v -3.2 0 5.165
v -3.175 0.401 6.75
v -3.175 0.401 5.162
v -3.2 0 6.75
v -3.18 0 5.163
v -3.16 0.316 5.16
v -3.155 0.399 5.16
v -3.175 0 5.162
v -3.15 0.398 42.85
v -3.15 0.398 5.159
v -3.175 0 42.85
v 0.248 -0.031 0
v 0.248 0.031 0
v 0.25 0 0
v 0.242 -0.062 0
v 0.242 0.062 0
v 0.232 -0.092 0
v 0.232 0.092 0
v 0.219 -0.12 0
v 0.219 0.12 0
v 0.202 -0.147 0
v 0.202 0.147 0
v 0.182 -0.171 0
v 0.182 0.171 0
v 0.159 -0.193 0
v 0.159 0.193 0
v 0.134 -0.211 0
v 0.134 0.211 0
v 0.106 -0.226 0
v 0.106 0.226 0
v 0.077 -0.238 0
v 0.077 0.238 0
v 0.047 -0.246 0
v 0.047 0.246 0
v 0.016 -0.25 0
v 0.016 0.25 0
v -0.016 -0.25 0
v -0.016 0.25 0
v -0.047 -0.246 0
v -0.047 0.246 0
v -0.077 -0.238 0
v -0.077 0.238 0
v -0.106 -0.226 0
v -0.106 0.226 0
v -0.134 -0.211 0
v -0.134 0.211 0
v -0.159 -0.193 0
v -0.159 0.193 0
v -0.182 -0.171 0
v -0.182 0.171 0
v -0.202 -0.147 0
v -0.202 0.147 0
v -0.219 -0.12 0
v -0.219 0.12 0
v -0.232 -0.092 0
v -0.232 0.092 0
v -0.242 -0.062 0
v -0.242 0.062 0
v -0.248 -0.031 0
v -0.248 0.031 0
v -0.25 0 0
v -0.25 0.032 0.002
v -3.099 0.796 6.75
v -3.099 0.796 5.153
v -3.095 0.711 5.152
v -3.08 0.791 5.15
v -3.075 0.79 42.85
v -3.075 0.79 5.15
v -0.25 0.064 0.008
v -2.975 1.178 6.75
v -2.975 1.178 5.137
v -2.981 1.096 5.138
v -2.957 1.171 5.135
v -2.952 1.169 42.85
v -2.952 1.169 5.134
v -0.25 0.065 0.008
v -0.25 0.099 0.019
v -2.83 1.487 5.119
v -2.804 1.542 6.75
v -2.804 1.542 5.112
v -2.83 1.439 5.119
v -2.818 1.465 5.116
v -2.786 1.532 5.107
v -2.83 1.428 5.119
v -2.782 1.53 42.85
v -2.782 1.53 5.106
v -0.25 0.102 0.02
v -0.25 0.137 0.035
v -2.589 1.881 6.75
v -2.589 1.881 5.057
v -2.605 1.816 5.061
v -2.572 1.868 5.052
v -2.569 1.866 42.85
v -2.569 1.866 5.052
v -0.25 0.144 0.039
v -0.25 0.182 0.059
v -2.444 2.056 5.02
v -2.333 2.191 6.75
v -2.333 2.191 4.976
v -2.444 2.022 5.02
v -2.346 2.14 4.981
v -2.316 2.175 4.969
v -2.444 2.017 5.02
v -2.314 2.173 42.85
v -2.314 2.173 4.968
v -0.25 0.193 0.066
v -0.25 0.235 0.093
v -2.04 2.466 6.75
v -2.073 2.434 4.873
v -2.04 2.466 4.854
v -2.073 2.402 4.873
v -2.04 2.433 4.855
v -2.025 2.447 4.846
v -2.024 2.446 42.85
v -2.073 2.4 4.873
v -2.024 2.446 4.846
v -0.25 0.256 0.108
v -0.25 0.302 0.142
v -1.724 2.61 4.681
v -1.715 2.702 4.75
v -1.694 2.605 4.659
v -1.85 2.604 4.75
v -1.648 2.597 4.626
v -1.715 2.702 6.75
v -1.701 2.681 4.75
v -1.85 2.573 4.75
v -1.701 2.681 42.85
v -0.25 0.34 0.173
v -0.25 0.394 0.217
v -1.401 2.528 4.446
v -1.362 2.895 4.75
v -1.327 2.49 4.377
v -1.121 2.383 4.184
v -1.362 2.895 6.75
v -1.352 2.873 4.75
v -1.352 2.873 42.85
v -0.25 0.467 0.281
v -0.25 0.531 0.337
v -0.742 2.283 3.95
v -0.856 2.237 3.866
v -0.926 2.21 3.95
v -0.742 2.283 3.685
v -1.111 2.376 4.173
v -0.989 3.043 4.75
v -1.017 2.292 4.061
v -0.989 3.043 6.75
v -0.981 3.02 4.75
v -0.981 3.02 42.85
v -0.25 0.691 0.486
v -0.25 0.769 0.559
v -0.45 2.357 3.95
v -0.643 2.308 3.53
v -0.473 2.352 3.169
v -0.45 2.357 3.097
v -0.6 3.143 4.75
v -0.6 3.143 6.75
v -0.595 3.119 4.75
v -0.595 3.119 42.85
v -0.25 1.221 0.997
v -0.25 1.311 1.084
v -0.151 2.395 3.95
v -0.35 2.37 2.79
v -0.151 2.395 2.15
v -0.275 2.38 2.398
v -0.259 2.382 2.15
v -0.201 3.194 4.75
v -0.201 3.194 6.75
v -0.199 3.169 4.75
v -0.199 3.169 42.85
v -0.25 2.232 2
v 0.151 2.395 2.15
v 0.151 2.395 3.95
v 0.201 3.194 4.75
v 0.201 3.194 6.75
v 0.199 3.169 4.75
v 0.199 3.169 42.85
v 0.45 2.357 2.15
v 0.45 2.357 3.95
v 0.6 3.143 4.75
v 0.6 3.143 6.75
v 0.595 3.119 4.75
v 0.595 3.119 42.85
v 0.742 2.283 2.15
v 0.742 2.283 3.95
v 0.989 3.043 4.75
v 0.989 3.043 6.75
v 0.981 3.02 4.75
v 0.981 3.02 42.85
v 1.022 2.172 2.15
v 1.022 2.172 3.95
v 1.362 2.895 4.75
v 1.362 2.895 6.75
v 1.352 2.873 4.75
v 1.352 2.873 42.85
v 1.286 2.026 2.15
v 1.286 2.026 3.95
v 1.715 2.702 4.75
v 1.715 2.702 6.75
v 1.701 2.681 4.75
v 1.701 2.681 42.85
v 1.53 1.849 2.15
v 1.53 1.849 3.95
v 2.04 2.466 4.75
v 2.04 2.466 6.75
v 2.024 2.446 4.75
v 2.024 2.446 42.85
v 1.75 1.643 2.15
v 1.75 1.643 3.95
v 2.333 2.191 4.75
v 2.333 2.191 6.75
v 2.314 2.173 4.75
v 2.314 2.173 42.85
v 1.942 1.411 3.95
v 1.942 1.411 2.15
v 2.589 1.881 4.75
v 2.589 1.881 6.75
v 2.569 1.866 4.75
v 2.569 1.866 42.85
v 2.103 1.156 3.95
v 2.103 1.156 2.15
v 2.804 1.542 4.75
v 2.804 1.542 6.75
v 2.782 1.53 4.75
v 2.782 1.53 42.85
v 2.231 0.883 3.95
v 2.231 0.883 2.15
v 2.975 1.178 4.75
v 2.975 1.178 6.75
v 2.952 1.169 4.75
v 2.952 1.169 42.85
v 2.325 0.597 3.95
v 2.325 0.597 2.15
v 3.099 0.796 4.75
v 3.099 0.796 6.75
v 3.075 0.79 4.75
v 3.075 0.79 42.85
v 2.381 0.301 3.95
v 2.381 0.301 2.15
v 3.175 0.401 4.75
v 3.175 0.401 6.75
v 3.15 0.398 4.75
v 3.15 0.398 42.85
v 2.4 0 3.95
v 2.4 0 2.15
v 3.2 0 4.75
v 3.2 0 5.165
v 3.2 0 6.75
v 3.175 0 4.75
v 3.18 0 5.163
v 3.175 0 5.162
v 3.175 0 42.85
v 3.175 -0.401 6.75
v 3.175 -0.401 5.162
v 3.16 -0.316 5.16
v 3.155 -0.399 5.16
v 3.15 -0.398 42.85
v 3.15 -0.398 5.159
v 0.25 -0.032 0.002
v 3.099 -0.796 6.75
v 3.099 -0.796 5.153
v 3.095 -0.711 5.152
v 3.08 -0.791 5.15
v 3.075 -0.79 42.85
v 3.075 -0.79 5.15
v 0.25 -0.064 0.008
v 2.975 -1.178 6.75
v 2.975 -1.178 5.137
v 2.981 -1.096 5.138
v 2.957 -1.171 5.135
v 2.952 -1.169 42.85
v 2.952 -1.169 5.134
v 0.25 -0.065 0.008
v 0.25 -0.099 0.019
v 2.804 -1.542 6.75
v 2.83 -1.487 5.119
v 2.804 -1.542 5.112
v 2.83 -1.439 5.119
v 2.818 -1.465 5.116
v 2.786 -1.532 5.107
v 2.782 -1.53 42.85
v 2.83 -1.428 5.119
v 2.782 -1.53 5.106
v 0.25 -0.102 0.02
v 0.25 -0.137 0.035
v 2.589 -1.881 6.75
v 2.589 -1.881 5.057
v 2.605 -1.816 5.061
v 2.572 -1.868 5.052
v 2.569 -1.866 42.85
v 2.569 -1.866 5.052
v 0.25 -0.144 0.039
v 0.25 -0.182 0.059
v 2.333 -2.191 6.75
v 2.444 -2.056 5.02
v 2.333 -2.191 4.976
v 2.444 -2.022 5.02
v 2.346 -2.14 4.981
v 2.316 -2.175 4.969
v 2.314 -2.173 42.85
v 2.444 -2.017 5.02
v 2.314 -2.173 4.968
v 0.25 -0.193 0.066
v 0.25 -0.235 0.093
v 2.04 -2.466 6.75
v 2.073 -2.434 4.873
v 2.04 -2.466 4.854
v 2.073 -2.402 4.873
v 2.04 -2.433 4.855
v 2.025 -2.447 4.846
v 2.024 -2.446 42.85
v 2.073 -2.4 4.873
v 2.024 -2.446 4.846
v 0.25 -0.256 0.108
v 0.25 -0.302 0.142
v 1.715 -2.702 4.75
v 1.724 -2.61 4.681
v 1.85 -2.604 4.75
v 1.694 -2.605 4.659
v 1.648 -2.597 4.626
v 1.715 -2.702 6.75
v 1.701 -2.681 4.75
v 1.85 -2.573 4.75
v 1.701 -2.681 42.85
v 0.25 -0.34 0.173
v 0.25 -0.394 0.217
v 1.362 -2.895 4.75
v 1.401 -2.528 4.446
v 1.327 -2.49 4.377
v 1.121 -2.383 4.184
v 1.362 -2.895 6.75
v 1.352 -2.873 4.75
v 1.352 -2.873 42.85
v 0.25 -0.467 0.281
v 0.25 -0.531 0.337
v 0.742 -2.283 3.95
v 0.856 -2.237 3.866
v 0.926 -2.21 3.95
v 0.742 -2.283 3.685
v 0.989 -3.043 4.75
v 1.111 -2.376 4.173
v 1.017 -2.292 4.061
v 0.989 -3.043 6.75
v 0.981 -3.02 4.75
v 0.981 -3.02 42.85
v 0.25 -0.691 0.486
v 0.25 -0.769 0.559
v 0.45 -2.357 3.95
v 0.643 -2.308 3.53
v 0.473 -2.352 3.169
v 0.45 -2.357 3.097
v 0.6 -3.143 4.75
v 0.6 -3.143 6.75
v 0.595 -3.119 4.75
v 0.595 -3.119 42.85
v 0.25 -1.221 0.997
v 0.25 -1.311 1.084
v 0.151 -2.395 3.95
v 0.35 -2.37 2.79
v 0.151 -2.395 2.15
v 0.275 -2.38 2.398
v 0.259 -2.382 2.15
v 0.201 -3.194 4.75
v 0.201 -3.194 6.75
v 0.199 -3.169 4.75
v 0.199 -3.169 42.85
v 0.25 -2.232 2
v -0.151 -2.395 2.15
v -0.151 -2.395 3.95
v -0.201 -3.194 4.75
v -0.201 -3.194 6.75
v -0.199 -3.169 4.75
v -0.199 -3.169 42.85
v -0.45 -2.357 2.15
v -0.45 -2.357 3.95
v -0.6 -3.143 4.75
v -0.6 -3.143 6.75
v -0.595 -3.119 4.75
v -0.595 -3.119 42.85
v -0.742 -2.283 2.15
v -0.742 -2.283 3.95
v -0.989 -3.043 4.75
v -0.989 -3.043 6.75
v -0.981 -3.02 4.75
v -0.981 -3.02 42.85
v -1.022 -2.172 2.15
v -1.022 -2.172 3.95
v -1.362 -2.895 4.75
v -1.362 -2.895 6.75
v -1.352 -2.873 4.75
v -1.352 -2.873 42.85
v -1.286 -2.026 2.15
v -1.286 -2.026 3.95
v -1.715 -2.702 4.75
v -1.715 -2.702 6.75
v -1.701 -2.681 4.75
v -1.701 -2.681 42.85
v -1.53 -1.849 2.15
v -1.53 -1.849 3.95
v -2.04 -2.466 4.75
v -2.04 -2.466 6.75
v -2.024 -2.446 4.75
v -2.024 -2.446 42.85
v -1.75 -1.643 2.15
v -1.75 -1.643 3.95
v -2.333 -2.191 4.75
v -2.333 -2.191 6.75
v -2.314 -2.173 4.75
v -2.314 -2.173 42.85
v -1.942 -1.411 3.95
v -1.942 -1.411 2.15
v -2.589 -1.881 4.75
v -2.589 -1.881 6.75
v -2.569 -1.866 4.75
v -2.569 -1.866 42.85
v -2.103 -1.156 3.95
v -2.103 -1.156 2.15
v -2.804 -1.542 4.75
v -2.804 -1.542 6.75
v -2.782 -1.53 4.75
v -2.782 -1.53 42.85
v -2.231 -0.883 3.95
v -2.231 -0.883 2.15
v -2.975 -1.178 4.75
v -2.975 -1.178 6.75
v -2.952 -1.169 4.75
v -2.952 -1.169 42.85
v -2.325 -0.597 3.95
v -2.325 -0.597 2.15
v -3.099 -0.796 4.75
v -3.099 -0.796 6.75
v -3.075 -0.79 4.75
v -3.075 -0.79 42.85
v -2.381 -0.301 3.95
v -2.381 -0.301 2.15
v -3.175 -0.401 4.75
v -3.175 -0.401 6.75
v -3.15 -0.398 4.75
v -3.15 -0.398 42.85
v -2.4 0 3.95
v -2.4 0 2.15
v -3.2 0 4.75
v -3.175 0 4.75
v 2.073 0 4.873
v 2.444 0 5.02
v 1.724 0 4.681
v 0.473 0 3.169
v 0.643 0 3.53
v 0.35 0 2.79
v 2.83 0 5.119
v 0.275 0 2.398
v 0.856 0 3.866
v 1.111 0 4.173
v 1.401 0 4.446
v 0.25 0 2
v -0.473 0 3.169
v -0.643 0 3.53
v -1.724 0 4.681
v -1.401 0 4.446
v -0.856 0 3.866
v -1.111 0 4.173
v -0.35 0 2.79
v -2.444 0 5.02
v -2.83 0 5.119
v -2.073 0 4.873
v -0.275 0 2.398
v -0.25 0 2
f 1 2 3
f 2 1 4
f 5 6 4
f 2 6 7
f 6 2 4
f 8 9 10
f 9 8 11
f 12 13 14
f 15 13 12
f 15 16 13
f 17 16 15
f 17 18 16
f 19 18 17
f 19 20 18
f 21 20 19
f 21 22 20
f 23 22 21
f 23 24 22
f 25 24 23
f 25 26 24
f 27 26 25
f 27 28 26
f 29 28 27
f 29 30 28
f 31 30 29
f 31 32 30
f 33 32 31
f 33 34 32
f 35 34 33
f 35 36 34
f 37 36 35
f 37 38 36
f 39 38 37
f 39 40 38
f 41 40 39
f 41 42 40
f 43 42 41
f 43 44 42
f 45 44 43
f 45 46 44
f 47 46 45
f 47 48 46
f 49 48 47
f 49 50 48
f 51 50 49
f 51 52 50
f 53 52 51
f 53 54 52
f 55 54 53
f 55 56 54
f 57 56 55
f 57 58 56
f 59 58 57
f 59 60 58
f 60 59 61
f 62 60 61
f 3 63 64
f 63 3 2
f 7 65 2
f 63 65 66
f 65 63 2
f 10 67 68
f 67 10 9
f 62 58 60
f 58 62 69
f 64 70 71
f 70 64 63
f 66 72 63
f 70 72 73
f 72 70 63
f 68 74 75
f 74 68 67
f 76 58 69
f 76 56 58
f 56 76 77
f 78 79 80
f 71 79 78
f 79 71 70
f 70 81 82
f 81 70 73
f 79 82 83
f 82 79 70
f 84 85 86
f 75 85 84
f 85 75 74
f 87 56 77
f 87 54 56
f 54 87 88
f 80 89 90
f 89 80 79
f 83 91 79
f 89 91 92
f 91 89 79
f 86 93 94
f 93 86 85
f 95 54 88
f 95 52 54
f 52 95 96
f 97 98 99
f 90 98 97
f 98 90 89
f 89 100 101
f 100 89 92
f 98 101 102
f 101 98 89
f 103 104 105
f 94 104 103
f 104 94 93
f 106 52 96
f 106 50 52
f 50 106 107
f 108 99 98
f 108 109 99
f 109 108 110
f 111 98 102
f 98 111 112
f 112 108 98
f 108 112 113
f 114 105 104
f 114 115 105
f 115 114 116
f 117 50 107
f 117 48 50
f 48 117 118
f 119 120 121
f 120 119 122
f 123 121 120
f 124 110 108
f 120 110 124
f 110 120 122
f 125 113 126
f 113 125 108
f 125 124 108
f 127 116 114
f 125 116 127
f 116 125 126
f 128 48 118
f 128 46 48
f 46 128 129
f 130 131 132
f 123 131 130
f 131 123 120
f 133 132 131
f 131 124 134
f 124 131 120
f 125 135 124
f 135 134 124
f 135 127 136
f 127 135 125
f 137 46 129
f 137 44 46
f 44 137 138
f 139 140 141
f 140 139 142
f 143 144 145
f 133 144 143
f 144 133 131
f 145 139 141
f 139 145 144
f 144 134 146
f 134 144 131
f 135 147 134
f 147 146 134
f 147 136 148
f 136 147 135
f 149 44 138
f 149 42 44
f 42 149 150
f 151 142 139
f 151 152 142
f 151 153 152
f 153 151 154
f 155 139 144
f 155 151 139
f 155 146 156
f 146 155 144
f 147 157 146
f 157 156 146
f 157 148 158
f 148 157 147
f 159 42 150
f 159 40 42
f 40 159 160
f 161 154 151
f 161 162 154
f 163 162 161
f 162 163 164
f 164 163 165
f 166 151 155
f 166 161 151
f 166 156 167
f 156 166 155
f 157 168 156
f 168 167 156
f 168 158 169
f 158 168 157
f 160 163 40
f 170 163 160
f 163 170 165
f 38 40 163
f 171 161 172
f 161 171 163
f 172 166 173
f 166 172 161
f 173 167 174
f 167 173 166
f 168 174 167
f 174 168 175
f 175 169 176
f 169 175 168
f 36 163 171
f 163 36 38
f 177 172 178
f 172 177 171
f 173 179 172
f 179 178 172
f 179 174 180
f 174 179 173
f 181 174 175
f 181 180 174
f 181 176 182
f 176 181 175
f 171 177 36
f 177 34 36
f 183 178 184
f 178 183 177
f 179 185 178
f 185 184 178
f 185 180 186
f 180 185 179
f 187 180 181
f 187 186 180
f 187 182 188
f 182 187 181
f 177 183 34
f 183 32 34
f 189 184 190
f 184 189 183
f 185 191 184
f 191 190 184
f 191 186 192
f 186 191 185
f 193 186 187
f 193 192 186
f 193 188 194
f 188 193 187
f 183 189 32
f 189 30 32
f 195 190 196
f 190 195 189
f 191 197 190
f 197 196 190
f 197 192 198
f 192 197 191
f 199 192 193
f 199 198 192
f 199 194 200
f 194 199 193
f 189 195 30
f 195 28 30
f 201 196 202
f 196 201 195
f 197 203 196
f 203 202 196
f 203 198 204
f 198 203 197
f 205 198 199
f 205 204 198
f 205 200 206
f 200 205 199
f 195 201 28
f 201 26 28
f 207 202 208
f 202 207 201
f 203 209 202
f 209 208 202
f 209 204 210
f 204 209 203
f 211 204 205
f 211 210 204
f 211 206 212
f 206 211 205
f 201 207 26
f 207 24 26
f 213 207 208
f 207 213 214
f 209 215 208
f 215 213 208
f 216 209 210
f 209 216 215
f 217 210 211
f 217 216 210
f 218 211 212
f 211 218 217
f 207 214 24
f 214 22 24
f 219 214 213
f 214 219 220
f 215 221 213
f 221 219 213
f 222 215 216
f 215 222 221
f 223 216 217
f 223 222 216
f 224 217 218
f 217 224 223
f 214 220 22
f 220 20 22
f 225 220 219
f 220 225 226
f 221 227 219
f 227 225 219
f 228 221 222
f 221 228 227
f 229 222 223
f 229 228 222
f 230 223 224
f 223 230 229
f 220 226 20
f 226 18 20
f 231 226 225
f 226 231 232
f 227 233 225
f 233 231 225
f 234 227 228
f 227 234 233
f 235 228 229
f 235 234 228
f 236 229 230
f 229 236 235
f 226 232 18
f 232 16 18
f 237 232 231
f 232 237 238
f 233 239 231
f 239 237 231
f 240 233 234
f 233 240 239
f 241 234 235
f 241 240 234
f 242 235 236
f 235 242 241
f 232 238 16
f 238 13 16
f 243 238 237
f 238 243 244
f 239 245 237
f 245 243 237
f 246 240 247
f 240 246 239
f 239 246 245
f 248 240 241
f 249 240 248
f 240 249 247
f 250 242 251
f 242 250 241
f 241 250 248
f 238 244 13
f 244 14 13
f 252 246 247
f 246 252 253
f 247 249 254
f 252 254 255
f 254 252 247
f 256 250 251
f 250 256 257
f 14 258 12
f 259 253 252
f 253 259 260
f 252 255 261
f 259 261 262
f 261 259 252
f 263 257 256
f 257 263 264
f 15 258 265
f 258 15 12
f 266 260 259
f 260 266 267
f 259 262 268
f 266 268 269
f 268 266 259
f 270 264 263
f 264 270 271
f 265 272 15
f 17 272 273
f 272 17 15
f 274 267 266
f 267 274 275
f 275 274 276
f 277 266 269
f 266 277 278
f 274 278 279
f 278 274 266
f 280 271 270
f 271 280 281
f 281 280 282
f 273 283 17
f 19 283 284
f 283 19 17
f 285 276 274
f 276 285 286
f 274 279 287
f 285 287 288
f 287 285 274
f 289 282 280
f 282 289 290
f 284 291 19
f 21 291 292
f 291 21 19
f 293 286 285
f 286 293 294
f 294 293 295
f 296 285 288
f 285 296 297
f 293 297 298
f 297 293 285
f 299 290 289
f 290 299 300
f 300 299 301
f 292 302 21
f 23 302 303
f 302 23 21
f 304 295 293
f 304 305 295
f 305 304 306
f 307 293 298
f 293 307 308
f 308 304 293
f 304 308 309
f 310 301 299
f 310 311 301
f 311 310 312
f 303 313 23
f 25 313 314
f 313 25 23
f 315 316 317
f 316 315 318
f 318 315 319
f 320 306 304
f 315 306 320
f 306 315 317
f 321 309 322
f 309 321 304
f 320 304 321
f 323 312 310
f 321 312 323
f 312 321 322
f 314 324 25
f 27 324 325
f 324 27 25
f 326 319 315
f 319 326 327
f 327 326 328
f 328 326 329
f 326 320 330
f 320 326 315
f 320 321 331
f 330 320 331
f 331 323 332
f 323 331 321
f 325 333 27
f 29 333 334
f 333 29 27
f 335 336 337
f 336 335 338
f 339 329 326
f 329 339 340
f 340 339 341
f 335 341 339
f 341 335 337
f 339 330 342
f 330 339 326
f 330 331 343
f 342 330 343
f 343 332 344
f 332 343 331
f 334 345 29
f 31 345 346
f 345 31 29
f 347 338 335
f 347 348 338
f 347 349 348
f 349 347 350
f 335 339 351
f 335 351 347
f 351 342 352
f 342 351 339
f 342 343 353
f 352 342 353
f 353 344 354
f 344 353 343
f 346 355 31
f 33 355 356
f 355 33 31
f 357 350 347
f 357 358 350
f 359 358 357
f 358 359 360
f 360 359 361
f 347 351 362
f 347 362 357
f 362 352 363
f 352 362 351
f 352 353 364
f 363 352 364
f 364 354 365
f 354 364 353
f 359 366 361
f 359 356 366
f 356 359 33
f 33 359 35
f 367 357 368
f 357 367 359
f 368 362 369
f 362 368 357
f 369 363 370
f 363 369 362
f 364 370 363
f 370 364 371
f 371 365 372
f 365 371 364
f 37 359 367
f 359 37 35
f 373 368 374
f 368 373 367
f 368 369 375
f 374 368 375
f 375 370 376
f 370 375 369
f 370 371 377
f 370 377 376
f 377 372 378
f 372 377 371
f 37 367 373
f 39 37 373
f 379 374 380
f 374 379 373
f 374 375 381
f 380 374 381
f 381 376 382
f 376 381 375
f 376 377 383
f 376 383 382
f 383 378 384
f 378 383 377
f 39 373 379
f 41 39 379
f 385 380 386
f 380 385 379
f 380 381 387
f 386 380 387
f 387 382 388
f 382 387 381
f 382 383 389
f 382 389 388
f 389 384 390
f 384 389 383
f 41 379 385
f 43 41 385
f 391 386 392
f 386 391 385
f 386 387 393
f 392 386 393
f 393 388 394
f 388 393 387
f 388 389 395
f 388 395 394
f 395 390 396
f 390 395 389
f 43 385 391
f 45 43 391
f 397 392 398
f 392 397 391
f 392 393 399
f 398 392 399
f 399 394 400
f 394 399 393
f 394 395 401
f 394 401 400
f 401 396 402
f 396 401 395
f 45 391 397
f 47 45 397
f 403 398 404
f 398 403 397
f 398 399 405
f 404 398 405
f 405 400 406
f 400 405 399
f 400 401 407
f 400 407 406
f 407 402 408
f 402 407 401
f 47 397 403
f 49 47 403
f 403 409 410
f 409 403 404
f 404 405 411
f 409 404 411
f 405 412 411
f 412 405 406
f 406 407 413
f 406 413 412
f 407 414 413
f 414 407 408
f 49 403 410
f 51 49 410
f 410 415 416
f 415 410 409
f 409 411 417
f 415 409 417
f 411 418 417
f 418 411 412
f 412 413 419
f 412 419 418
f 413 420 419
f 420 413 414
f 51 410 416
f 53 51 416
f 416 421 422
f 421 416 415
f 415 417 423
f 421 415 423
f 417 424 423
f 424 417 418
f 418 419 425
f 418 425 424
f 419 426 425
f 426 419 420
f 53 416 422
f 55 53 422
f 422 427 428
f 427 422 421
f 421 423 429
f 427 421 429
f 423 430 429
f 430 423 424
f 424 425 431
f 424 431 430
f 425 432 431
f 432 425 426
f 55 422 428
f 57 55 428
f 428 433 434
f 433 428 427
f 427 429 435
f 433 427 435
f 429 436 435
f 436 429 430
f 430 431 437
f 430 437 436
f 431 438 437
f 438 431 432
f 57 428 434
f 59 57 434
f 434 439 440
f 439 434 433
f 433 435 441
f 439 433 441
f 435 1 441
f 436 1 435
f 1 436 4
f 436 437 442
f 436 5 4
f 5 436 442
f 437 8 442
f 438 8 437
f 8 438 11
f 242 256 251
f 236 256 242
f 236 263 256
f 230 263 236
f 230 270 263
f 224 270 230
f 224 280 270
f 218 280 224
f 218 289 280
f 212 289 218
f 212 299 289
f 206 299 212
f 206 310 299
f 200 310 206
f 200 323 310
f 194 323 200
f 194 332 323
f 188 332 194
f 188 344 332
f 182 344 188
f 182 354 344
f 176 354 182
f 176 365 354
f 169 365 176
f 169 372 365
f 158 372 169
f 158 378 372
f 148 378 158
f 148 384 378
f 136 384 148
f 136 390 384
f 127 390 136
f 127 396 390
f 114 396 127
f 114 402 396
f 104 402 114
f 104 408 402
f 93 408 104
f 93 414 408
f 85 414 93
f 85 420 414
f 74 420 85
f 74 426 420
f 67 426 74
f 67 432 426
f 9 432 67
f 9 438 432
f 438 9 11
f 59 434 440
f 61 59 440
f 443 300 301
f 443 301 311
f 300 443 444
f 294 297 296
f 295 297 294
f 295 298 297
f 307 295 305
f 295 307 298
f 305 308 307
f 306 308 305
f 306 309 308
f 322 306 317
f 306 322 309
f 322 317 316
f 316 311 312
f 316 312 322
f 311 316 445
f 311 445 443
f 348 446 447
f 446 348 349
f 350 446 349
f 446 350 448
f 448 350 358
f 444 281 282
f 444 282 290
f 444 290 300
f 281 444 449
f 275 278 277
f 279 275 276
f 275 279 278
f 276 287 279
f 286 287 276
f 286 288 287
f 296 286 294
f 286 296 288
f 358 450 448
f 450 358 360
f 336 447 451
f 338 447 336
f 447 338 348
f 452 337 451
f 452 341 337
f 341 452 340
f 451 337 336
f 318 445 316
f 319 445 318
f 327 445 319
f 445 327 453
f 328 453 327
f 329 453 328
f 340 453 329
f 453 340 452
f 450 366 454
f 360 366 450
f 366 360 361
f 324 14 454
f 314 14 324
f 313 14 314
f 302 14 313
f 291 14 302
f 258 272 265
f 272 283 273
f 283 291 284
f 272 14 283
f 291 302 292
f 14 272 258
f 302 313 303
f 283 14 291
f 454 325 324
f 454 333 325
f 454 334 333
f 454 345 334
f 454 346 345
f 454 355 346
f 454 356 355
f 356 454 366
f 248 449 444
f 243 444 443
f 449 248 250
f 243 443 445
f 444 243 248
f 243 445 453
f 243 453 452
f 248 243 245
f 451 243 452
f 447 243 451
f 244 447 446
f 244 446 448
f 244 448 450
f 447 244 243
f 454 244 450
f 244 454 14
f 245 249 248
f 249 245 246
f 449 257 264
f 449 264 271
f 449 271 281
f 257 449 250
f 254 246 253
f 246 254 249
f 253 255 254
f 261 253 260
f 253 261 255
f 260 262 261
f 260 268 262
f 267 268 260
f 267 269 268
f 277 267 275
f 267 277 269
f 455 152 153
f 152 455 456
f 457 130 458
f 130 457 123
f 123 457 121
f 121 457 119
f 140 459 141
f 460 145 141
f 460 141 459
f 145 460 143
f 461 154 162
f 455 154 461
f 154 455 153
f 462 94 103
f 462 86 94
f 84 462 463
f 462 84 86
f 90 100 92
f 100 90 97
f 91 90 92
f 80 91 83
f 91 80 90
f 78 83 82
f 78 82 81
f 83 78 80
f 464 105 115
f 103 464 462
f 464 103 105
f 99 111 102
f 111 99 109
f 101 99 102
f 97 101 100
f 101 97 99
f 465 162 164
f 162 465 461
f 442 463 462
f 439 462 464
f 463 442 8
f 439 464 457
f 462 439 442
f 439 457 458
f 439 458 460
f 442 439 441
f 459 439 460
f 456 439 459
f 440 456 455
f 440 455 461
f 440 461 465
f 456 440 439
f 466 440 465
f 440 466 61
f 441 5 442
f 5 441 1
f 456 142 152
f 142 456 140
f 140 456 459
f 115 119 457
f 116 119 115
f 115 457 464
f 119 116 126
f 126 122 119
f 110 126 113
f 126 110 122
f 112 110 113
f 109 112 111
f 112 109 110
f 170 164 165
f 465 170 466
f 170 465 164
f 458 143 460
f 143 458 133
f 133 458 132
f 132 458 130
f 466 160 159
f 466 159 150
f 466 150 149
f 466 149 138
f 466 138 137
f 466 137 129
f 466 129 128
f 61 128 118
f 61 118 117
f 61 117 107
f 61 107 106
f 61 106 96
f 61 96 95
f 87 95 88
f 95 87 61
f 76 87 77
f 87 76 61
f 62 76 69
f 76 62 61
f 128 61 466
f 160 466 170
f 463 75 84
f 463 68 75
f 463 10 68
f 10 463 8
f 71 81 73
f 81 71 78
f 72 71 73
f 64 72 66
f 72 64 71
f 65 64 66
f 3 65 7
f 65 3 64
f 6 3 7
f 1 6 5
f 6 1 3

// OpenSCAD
$fn = 50;

INCH = 25.4;
shank_length = 1.5 * INCH;
shank_diameter = 1/4 * INCH;

module bottom_bit() {
    module body() {
        rotate_extrude()
        polygon(points=[
            [ 0                 , 0                               ],
            [ 0.25              , 0                               ],
            [ 0.25 + 2.15       , 2.15                            ],
            [ 0.25 + 2.15       , 2.15 + 1.8                      ],
            [ 0.25 + 2.15 + 0.8 , 2.15 + 1.8 + 0.8                ],
            [ 0.25 + 2.15 + 0.8 , 2.15 + 1.8 + 0.8 + 2            ],
            [ shank_diameter/2  , 2.15 + 1.8 + 0.8                ],
            [ shank_diameter/2  , 2.15 + 1.8 + 0.8 + shank_length ],
            [ 0                 , 2.15 + 1.8 + 0.8 + shank_length ],
            [ 0                 , 0 ]
        ]);
    }

    module flute() {
        flute_cutter_diameter = 1/4 * INCH;
        
        translate([flute_cutter_diameter/2 + 0.25, 0, 0])
        hull() {
        rotate([90, 0, 0]) cylinder(h=10, d=flute_cutter_diameter);
        
        translate([0,0,2])
        rotate([90, 0, 0]) cylinder(h=10, d=flute_cutter_diameter);
        }
    }

    difference() {
        body();
        flute();
        rotate([0, 0, 180]) flute();
    }
}

bottom_bit();
